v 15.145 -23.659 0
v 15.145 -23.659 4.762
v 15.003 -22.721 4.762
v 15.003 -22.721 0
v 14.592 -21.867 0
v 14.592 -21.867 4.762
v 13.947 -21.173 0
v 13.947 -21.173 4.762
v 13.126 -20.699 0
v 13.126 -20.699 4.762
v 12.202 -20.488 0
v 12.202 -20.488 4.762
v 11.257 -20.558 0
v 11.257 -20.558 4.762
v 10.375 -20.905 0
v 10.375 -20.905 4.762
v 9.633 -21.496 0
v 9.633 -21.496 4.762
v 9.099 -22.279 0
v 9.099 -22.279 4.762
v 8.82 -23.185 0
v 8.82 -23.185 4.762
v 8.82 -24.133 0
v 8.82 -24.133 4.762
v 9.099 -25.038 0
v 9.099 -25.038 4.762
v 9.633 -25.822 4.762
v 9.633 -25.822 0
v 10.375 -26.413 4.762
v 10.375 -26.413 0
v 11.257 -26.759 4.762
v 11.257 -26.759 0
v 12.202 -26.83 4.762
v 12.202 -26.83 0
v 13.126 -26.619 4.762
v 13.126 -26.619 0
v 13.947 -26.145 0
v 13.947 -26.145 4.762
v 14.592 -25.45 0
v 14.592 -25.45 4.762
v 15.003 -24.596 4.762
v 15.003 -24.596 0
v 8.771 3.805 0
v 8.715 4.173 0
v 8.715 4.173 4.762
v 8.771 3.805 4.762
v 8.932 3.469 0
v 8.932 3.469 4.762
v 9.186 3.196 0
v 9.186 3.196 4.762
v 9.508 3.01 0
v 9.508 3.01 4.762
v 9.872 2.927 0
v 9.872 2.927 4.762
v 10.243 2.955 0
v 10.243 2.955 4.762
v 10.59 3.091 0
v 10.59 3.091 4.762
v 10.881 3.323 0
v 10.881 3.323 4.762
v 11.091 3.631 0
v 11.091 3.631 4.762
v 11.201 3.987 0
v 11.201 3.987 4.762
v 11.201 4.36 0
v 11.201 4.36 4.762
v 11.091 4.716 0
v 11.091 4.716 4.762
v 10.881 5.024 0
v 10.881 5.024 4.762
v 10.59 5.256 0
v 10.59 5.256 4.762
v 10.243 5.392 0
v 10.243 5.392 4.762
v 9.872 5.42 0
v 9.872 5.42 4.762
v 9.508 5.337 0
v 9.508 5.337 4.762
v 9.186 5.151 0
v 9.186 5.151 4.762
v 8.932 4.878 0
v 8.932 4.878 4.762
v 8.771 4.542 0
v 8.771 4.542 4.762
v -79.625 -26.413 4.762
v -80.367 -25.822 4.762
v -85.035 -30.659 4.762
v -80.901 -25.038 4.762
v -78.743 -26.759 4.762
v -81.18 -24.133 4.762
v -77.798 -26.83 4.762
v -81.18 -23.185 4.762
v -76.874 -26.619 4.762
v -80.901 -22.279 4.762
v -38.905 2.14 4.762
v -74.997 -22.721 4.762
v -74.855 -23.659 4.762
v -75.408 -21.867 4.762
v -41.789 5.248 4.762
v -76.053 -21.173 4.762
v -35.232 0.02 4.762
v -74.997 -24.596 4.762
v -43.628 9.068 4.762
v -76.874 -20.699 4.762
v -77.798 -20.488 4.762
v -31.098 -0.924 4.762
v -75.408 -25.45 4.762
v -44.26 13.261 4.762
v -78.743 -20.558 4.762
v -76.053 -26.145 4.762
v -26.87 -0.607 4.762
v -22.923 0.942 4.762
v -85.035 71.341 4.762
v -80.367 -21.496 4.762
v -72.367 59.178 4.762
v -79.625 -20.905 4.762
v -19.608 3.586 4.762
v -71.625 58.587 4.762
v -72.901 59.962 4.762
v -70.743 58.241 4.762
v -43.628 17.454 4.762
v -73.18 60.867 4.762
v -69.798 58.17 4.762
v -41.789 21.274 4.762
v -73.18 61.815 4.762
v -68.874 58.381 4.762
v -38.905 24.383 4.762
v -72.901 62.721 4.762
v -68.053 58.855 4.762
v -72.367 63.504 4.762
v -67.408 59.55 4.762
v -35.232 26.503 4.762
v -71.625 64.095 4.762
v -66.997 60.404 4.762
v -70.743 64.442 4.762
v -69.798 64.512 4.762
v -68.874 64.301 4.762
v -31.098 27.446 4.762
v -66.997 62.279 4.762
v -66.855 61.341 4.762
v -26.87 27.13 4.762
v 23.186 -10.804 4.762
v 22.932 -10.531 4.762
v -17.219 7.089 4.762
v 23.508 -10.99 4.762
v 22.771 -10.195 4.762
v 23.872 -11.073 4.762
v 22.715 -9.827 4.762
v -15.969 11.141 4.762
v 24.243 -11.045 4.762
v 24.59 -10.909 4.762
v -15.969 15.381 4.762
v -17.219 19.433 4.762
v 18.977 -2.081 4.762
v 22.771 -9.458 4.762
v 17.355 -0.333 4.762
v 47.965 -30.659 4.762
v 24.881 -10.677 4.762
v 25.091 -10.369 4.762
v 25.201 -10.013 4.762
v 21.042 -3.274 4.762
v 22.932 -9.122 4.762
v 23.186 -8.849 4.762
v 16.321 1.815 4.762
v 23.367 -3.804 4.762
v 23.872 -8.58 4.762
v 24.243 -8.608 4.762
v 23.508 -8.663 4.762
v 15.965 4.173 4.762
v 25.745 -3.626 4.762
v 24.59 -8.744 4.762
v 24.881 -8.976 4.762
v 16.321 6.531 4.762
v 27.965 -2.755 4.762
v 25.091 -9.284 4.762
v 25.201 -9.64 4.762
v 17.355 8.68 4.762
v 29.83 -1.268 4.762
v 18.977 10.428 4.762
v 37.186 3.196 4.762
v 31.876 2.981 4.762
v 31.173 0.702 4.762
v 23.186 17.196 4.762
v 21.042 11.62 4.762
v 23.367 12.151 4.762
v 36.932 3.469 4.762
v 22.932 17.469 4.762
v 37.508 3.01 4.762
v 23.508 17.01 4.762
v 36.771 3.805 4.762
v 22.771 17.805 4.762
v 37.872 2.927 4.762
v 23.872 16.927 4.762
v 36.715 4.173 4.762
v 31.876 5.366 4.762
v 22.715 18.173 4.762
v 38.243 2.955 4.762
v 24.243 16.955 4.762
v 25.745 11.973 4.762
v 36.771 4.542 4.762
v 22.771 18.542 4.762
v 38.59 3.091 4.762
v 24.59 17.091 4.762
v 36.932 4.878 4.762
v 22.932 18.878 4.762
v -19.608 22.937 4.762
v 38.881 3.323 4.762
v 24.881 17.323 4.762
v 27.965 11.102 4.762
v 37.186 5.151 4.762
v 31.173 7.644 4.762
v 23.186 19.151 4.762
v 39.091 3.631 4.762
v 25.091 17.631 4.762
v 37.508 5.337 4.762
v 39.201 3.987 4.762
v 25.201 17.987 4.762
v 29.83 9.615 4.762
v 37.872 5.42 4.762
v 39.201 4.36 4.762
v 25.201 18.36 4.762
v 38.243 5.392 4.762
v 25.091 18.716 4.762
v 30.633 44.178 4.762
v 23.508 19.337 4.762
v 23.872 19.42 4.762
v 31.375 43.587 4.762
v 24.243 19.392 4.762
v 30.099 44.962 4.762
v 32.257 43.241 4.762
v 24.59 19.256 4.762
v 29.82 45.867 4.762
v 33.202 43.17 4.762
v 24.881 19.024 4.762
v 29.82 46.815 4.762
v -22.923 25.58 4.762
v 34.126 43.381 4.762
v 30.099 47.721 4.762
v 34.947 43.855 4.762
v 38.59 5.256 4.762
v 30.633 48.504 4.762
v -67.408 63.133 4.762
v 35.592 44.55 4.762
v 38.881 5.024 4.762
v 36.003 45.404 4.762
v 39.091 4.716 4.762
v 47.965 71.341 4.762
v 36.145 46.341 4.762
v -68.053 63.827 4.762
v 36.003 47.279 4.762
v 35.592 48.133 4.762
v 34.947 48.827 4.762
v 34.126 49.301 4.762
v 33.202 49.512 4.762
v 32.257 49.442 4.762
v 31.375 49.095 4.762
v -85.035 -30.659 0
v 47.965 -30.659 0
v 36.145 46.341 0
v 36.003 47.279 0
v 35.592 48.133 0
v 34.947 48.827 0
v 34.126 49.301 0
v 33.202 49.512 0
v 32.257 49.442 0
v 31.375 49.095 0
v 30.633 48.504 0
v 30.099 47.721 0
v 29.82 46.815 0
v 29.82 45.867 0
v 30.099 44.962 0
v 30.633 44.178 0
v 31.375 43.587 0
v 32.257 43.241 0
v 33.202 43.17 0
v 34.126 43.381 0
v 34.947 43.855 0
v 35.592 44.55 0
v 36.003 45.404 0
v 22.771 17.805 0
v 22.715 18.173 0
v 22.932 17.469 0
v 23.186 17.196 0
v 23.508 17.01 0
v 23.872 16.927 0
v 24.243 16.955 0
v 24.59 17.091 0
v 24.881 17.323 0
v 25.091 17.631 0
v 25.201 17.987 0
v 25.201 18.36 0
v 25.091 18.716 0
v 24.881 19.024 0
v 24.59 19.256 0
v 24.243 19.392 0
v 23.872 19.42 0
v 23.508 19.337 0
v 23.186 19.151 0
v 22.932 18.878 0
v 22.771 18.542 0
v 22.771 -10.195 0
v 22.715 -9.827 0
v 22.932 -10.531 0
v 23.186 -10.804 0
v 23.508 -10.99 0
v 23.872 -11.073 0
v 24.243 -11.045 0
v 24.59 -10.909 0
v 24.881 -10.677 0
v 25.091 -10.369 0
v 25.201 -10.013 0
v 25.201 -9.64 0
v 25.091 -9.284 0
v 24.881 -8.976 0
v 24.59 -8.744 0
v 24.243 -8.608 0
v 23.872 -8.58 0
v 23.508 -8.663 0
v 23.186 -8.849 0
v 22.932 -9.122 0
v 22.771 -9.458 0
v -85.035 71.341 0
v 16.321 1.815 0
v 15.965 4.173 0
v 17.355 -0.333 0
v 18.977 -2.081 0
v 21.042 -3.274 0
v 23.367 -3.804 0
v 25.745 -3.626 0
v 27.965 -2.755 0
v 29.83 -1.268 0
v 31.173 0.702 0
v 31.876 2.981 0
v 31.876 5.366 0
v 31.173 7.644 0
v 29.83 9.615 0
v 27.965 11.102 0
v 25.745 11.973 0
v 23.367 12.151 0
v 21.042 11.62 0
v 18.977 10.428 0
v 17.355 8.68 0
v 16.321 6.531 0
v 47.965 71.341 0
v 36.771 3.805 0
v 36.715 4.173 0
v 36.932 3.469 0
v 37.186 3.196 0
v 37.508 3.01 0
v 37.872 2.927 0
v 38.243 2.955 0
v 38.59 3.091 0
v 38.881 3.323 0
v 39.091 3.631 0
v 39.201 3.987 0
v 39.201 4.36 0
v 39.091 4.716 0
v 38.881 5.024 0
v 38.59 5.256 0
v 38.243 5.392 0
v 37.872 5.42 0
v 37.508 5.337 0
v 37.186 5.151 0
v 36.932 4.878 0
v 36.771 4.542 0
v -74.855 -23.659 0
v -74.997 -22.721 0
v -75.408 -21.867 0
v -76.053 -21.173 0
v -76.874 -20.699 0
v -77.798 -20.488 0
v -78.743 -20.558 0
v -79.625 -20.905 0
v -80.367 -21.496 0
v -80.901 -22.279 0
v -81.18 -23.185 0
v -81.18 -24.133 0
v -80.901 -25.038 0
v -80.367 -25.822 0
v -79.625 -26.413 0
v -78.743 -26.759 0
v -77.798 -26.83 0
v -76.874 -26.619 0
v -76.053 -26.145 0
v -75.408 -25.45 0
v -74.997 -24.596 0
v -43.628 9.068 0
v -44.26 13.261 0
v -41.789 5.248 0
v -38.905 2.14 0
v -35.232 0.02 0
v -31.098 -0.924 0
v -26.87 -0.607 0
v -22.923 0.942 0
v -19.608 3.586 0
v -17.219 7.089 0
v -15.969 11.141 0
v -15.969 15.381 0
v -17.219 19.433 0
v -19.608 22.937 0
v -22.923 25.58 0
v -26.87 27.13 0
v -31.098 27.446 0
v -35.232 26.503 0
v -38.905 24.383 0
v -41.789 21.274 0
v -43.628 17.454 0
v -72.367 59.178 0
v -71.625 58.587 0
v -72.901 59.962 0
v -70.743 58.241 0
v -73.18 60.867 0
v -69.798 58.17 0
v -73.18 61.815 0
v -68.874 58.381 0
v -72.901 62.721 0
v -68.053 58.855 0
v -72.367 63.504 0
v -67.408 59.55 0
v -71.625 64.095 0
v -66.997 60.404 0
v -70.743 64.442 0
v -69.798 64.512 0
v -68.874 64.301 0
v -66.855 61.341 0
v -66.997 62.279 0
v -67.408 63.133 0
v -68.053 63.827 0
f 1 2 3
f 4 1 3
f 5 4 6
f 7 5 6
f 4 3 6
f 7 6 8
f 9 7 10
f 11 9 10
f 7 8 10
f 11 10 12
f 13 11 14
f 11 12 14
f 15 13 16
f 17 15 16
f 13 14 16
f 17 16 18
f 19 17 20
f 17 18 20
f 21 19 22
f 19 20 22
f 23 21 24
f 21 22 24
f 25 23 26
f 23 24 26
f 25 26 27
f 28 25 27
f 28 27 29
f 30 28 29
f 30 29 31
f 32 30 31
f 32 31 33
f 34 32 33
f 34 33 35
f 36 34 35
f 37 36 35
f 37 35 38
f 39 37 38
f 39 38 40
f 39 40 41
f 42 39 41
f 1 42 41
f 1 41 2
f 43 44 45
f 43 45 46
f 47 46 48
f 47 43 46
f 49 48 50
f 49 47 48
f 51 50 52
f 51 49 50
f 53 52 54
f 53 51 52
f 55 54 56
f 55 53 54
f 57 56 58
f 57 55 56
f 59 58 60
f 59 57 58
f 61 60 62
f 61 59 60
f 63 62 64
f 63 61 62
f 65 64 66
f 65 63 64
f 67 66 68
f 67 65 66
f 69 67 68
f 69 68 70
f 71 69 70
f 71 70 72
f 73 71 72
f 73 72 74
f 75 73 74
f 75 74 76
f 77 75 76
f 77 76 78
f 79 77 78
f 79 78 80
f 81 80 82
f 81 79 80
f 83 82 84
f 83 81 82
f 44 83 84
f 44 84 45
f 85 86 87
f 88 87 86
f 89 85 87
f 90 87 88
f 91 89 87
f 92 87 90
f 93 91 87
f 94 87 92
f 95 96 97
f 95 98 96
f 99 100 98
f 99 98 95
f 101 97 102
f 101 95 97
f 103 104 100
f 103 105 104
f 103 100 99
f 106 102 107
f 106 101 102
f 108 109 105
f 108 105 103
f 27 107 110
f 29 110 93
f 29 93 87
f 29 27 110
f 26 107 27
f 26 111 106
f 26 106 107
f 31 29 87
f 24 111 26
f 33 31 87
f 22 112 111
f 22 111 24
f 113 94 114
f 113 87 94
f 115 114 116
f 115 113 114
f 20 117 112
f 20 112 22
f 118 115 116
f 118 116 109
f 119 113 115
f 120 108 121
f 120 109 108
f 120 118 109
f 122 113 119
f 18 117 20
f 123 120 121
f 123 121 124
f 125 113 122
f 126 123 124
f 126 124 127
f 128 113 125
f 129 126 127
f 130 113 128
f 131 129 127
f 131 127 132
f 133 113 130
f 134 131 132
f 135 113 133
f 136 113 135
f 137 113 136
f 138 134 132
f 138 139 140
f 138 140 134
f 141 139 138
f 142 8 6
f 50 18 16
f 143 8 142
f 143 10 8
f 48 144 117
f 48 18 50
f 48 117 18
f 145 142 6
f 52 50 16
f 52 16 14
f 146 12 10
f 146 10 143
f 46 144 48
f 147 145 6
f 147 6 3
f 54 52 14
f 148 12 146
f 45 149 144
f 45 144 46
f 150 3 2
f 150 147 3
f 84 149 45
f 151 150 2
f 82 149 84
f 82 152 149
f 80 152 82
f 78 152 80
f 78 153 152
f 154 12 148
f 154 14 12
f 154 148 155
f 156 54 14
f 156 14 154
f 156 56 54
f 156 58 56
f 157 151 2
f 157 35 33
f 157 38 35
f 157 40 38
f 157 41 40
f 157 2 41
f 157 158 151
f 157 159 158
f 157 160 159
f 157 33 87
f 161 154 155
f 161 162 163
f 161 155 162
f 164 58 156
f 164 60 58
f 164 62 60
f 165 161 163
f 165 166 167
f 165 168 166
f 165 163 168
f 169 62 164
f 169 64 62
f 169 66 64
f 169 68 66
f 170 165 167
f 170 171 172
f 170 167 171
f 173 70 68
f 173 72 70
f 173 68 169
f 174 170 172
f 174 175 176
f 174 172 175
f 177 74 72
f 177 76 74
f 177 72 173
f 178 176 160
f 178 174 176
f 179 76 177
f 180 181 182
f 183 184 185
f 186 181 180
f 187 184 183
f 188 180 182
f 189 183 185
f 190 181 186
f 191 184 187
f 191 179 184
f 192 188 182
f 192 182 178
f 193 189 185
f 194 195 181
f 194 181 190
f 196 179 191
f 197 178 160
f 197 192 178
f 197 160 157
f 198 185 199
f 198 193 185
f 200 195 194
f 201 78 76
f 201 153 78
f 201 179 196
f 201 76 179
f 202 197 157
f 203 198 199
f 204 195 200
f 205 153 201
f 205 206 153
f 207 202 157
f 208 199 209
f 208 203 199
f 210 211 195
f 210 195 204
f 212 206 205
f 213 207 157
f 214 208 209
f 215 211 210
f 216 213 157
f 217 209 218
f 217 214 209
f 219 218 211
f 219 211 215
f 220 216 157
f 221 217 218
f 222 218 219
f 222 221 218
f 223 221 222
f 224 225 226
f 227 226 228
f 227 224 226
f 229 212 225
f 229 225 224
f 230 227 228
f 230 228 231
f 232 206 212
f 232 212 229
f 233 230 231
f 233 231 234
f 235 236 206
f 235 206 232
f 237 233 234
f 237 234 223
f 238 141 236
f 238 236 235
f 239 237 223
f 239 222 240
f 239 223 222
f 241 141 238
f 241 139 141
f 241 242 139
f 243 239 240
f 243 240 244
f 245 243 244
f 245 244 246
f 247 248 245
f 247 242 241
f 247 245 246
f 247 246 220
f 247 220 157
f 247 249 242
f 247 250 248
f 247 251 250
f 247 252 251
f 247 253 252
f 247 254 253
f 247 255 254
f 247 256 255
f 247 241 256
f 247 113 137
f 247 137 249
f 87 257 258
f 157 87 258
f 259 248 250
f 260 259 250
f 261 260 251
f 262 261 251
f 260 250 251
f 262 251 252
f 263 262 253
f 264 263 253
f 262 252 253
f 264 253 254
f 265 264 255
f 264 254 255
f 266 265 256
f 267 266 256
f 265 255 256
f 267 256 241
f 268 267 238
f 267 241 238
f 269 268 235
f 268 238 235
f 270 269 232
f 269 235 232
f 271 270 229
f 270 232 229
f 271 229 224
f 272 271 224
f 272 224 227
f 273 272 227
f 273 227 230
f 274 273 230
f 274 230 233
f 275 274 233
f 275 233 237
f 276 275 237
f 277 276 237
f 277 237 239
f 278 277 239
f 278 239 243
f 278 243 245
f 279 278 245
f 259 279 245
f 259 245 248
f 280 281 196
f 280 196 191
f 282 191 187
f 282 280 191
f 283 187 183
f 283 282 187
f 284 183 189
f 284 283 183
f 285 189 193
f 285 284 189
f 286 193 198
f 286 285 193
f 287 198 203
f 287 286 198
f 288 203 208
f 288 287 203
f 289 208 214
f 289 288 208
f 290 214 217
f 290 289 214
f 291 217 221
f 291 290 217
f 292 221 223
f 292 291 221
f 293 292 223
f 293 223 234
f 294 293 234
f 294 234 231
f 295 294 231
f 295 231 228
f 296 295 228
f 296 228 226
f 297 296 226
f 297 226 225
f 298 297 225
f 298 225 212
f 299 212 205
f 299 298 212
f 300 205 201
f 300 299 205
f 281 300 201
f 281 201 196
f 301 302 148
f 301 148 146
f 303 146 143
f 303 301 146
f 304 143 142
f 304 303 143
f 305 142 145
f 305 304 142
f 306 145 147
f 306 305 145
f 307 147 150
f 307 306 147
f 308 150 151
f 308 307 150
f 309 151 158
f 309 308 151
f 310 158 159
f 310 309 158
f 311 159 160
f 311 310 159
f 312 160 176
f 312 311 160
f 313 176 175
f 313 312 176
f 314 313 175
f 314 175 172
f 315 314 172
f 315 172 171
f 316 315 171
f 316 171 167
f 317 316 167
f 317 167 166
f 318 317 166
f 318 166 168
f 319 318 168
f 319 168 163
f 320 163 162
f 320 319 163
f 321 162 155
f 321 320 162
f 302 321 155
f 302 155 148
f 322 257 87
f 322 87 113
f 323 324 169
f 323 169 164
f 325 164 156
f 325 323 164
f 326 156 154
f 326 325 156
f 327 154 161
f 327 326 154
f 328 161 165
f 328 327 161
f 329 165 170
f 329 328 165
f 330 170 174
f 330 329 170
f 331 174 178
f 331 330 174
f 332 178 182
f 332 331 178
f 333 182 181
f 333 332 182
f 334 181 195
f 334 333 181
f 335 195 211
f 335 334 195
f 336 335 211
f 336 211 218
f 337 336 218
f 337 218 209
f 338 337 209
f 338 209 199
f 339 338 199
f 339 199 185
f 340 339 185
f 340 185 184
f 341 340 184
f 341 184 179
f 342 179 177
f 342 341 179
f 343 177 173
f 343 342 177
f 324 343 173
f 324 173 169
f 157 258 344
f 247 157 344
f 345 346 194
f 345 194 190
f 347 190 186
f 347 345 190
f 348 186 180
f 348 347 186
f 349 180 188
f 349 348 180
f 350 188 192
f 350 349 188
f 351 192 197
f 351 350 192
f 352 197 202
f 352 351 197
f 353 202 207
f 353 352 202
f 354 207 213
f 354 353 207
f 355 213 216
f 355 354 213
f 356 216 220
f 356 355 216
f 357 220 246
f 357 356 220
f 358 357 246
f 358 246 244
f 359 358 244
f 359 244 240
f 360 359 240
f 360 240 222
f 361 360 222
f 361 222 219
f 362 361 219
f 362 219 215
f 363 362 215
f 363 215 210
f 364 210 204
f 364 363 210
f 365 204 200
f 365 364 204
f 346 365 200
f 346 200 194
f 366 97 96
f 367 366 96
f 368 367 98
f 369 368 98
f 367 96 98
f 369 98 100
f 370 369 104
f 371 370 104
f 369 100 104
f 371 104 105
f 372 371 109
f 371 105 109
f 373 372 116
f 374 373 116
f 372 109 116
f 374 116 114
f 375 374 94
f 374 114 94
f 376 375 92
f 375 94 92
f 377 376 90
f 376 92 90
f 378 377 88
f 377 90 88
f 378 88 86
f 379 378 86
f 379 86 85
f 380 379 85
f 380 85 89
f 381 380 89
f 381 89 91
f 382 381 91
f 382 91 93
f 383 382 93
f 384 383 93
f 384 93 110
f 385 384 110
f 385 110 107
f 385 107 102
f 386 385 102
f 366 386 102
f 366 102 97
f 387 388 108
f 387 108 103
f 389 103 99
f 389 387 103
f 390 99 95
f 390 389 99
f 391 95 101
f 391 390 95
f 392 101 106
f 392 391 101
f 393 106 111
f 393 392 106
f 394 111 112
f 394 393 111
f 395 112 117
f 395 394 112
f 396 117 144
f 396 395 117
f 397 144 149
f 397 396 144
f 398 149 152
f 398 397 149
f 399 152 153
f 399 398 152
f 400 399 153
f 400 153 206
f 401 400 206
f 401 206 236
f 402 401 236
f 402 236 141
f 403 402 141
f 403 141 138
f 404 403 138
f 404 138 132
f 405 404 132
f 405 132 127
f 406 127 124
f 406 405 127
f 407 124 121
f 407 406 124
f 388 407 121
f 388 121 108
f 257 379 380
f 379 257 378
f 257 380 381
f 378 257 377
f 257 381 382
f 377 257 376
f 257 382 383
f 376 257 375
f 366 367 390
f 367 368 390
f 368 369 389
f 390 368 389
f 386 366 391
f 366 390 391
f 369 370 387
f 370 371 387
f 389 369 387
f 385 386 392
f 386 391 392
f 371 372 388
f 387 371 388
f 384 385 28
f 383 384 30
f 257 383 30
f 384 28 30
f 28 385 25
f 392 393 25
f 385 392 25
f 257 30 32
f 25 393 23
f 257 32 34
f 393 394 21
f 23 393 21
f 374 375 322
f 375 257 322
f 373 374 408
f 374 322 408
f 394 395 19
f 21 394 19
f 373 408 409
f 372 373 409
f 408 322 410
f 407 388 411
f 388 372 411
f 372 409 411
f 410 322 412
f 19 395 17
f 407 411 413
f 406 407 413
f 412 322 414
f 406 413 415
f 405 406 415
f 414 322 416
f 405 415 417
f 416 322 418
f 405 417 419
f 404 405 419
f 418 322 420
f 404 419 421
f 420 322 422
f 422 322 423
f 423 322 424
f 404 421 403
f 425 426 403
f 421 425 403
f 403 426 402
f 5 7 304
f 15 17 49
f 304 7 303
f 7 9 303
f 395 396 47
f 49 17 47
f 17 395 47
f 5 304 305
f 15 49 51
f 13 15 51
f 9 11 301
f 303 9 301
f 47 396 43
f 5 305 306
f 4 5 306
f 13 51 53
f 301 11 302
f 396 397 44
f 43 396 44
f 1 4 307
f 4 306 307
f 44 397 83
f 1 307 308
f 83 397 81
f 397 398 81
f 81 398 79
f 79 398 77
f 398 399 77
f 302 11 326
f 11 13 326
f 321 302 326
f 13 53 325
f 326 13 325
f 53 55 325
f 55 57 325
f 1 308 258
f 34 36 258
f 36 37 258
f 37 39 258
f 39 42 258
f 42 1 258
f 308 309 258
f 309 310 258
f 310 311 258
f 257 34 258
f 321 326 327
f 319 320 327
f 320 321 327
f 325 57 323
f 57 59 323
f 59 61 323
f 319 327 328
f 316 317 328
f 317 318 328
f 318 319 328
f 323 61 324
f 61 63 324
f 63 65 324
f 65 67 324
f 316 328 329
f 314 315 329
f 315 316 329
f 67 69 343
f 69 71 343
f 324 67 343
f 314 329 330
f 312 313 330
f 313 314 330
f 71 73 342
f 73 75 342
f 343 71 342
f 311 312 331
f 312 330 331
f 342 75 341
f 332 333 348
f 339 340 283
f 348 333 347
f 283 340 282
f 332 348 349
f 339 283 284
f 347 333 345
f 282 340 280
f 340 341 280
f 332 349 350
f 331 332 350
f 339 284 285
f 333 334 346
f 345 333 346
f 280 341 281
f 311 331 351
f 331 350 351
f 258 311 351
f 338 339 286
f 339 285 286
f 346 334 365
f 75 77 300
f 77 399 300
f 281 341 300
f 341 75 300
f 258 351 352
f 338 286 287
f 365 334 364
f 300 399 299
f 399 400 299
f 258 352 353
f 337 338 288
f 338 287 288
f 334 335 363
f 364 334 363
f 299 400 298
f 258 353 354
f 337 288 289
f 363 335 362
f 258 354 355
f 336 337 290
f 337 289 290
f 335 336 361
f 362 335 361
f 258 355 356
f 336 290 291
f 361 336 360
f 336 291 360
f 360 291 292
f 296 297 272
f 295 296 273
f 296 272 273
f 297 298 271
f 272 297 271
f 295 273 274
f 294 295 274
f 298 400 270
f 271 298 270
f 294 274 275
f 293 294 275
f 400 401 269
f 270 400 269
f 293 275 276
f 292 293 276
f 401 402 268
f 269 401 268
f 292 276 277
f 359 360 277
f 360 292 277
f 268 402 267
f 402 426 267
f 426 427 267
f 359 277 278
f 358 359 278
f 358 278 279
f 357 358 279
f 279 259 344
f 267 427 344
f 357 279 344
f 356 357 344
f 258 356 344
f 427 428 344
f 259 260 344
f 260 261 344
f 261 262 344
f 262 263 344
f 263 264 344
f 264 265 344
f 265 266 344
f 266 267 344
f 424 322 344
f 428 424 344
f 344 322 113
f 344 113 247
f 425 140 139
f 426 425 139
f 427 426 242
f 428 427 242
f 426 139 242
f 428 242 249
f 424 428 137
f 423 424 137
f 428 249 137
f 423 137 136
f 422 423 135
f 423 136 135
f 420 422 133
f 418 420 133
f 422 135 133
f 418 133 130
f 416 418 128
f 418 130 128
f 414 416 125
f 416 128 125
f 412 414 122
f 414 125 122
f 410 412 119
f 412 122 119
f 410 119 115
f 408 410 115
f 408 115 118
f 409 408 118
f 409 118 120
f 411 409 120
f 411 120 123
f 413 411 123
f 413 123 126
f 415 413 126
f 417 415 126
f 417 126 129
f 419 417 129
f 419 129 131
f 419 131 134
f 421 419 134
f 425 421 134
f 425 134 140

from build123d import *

# Parameters (mm, degrees)
SKETCH1_W           = 133
SKETCH1_H           = 102
SKETCH1_R           = 14.225
SKETCH1_R_2         = 1.25
SKETCH1_R_3         = 8
BOSS_EXTRUDE2_DEPTH = 4.7625
CUT_EXTRUDE1_REACH  = 113.1
SKETCH2_R           = 3.18


with BuildPart() as part:
    # Sketch1 → Boss-Extrude2 (new body)
    with BuildSketch(Plane.XY):
        with Locations((-18.535460993, 20.341271178)):
            Rectangle(SKETCH1_W, SKETCH1_H)
        with Locations(Location((-30.035460993, 13.261258957, 0), (0, 0, 180))):
            Circle(SKETCH1_R, mode=Mode.SUBTRACT)
        with Locations(Location((23.965174075, -9.826590747, 0), (0, 0, 180))):
            Circle(SKETCH1_R_2, mode=Mode.SUBTRACT)
        with Locations(Location((37.965174075, 4.173409253, 0), (0, 0, 180))):
            Circle(SKETCH1_R_2, mode=Mode.SUBTRACT)
        with Locations(Location((23.965174075, 18.173409253, 0), (0, 0, 180))):
            Circle(SKETCH1_R_2, mode=Mode.SUBTRACT)
        with Locations(Location((9.965174075, 4.173409253, 0), (0, 0, 180))):
            Circle(SKETCH1_R_2, mode=Mode.SUBTRACT)
        with Locations(Location((23.965174075, 4.173409253, 0), (0, 0, 180))):
            Circle(SKETCH1_R_3, mode=Mode.SUBTRACT)
    extrude(amount=BOSS_EXTRUDE2_DEPTH)

    # Sketch2 → Cut-Extrude1 (cut, up to next)
    with BuildSketch(Plane.XY.offset(4.7625), mode=Mode.PRIVATE) as cut_extrude1_sk1:
        with Locations((-70.035460993, 61.341271178)):
            Circle(SKETCH2_R)
    cut_extrude1_tool1 = extrude(cut_extrude1_sk1.sketch, amount=-CUT_EXTRUDE1_REACH, mode=Mode.PRIVATE) & part.part
    # Sketch2 → Cut-Extrude1 (cut, up to next)
    with BuildSketch(Plane.XY.offset(4.7625), mode=Mode.PRIVATE) as cut_extrude1_sk2:
        with Locations((32.964539007, 46.341271178)):
            Circle(SKETCH2_R)
    cut_extrude1_tool2 = extrude(cut_extrude1_sk2.sketch, amount=-CUT_EXTRUDE1_REACH, mode=Mode.PRIVATE) & part.part
    # Sketch2 → Cut-Extrude1 (cut, up to next)
    with BuildSketch(Plane.XY.offset(4.7625), mode=Mode.PRIVATE) as cut_extrude1_sk3:
        with Locations((11.964539007, -23.658728822)):
            Circle(SKETCH2_R)
    cut_extrude1_tool3 = extrude(cut_extrude1_sk3.sketch, amount=-CUT_EXTRUDE1_REACH, mode=Mode.PRIVATE) & part.part
    # Sketch2 → Cut-Extrude1 (cut, up to next)
    with BuildSketch(Plane.XY.offset(4.7625), mode=Mode.PRIVATE) as cut_extrude1_sk4:
        with Locations((-78.035460993, -23.658728822)):
            Circle(SKETCH2_R)
    cut_extrude1_tool4 = extrude(cut_extrude1_sk4.sketch, amount=-CUT_EXTRUDE1_REACH, mode=Mode.PRIVATE) & part.part
    add(cut_extrude1_tool1.solids().sort_by_distance((-70.035461, 61.341271, 4.7625))[0], mode=Mode.SUBTRACT)
    add(cut_extrude1_tool2.solids().sort_by_distance((32.964539, 46.341271, 4.7625))[0], mode=Mode.SUBTRACT)
    add(cut_extrude1_tool3.solids().sort_by_distance((11.964539, -23.658729, 4.7625))[0], mode=Mode.SUBTRACT)
    add(cut_extrude1_tool4.solids().sort_by_distance((-78.035461, -23.658729, 4.7625))[0], mode=Mode.SUBTRACT)


solid = part.part
